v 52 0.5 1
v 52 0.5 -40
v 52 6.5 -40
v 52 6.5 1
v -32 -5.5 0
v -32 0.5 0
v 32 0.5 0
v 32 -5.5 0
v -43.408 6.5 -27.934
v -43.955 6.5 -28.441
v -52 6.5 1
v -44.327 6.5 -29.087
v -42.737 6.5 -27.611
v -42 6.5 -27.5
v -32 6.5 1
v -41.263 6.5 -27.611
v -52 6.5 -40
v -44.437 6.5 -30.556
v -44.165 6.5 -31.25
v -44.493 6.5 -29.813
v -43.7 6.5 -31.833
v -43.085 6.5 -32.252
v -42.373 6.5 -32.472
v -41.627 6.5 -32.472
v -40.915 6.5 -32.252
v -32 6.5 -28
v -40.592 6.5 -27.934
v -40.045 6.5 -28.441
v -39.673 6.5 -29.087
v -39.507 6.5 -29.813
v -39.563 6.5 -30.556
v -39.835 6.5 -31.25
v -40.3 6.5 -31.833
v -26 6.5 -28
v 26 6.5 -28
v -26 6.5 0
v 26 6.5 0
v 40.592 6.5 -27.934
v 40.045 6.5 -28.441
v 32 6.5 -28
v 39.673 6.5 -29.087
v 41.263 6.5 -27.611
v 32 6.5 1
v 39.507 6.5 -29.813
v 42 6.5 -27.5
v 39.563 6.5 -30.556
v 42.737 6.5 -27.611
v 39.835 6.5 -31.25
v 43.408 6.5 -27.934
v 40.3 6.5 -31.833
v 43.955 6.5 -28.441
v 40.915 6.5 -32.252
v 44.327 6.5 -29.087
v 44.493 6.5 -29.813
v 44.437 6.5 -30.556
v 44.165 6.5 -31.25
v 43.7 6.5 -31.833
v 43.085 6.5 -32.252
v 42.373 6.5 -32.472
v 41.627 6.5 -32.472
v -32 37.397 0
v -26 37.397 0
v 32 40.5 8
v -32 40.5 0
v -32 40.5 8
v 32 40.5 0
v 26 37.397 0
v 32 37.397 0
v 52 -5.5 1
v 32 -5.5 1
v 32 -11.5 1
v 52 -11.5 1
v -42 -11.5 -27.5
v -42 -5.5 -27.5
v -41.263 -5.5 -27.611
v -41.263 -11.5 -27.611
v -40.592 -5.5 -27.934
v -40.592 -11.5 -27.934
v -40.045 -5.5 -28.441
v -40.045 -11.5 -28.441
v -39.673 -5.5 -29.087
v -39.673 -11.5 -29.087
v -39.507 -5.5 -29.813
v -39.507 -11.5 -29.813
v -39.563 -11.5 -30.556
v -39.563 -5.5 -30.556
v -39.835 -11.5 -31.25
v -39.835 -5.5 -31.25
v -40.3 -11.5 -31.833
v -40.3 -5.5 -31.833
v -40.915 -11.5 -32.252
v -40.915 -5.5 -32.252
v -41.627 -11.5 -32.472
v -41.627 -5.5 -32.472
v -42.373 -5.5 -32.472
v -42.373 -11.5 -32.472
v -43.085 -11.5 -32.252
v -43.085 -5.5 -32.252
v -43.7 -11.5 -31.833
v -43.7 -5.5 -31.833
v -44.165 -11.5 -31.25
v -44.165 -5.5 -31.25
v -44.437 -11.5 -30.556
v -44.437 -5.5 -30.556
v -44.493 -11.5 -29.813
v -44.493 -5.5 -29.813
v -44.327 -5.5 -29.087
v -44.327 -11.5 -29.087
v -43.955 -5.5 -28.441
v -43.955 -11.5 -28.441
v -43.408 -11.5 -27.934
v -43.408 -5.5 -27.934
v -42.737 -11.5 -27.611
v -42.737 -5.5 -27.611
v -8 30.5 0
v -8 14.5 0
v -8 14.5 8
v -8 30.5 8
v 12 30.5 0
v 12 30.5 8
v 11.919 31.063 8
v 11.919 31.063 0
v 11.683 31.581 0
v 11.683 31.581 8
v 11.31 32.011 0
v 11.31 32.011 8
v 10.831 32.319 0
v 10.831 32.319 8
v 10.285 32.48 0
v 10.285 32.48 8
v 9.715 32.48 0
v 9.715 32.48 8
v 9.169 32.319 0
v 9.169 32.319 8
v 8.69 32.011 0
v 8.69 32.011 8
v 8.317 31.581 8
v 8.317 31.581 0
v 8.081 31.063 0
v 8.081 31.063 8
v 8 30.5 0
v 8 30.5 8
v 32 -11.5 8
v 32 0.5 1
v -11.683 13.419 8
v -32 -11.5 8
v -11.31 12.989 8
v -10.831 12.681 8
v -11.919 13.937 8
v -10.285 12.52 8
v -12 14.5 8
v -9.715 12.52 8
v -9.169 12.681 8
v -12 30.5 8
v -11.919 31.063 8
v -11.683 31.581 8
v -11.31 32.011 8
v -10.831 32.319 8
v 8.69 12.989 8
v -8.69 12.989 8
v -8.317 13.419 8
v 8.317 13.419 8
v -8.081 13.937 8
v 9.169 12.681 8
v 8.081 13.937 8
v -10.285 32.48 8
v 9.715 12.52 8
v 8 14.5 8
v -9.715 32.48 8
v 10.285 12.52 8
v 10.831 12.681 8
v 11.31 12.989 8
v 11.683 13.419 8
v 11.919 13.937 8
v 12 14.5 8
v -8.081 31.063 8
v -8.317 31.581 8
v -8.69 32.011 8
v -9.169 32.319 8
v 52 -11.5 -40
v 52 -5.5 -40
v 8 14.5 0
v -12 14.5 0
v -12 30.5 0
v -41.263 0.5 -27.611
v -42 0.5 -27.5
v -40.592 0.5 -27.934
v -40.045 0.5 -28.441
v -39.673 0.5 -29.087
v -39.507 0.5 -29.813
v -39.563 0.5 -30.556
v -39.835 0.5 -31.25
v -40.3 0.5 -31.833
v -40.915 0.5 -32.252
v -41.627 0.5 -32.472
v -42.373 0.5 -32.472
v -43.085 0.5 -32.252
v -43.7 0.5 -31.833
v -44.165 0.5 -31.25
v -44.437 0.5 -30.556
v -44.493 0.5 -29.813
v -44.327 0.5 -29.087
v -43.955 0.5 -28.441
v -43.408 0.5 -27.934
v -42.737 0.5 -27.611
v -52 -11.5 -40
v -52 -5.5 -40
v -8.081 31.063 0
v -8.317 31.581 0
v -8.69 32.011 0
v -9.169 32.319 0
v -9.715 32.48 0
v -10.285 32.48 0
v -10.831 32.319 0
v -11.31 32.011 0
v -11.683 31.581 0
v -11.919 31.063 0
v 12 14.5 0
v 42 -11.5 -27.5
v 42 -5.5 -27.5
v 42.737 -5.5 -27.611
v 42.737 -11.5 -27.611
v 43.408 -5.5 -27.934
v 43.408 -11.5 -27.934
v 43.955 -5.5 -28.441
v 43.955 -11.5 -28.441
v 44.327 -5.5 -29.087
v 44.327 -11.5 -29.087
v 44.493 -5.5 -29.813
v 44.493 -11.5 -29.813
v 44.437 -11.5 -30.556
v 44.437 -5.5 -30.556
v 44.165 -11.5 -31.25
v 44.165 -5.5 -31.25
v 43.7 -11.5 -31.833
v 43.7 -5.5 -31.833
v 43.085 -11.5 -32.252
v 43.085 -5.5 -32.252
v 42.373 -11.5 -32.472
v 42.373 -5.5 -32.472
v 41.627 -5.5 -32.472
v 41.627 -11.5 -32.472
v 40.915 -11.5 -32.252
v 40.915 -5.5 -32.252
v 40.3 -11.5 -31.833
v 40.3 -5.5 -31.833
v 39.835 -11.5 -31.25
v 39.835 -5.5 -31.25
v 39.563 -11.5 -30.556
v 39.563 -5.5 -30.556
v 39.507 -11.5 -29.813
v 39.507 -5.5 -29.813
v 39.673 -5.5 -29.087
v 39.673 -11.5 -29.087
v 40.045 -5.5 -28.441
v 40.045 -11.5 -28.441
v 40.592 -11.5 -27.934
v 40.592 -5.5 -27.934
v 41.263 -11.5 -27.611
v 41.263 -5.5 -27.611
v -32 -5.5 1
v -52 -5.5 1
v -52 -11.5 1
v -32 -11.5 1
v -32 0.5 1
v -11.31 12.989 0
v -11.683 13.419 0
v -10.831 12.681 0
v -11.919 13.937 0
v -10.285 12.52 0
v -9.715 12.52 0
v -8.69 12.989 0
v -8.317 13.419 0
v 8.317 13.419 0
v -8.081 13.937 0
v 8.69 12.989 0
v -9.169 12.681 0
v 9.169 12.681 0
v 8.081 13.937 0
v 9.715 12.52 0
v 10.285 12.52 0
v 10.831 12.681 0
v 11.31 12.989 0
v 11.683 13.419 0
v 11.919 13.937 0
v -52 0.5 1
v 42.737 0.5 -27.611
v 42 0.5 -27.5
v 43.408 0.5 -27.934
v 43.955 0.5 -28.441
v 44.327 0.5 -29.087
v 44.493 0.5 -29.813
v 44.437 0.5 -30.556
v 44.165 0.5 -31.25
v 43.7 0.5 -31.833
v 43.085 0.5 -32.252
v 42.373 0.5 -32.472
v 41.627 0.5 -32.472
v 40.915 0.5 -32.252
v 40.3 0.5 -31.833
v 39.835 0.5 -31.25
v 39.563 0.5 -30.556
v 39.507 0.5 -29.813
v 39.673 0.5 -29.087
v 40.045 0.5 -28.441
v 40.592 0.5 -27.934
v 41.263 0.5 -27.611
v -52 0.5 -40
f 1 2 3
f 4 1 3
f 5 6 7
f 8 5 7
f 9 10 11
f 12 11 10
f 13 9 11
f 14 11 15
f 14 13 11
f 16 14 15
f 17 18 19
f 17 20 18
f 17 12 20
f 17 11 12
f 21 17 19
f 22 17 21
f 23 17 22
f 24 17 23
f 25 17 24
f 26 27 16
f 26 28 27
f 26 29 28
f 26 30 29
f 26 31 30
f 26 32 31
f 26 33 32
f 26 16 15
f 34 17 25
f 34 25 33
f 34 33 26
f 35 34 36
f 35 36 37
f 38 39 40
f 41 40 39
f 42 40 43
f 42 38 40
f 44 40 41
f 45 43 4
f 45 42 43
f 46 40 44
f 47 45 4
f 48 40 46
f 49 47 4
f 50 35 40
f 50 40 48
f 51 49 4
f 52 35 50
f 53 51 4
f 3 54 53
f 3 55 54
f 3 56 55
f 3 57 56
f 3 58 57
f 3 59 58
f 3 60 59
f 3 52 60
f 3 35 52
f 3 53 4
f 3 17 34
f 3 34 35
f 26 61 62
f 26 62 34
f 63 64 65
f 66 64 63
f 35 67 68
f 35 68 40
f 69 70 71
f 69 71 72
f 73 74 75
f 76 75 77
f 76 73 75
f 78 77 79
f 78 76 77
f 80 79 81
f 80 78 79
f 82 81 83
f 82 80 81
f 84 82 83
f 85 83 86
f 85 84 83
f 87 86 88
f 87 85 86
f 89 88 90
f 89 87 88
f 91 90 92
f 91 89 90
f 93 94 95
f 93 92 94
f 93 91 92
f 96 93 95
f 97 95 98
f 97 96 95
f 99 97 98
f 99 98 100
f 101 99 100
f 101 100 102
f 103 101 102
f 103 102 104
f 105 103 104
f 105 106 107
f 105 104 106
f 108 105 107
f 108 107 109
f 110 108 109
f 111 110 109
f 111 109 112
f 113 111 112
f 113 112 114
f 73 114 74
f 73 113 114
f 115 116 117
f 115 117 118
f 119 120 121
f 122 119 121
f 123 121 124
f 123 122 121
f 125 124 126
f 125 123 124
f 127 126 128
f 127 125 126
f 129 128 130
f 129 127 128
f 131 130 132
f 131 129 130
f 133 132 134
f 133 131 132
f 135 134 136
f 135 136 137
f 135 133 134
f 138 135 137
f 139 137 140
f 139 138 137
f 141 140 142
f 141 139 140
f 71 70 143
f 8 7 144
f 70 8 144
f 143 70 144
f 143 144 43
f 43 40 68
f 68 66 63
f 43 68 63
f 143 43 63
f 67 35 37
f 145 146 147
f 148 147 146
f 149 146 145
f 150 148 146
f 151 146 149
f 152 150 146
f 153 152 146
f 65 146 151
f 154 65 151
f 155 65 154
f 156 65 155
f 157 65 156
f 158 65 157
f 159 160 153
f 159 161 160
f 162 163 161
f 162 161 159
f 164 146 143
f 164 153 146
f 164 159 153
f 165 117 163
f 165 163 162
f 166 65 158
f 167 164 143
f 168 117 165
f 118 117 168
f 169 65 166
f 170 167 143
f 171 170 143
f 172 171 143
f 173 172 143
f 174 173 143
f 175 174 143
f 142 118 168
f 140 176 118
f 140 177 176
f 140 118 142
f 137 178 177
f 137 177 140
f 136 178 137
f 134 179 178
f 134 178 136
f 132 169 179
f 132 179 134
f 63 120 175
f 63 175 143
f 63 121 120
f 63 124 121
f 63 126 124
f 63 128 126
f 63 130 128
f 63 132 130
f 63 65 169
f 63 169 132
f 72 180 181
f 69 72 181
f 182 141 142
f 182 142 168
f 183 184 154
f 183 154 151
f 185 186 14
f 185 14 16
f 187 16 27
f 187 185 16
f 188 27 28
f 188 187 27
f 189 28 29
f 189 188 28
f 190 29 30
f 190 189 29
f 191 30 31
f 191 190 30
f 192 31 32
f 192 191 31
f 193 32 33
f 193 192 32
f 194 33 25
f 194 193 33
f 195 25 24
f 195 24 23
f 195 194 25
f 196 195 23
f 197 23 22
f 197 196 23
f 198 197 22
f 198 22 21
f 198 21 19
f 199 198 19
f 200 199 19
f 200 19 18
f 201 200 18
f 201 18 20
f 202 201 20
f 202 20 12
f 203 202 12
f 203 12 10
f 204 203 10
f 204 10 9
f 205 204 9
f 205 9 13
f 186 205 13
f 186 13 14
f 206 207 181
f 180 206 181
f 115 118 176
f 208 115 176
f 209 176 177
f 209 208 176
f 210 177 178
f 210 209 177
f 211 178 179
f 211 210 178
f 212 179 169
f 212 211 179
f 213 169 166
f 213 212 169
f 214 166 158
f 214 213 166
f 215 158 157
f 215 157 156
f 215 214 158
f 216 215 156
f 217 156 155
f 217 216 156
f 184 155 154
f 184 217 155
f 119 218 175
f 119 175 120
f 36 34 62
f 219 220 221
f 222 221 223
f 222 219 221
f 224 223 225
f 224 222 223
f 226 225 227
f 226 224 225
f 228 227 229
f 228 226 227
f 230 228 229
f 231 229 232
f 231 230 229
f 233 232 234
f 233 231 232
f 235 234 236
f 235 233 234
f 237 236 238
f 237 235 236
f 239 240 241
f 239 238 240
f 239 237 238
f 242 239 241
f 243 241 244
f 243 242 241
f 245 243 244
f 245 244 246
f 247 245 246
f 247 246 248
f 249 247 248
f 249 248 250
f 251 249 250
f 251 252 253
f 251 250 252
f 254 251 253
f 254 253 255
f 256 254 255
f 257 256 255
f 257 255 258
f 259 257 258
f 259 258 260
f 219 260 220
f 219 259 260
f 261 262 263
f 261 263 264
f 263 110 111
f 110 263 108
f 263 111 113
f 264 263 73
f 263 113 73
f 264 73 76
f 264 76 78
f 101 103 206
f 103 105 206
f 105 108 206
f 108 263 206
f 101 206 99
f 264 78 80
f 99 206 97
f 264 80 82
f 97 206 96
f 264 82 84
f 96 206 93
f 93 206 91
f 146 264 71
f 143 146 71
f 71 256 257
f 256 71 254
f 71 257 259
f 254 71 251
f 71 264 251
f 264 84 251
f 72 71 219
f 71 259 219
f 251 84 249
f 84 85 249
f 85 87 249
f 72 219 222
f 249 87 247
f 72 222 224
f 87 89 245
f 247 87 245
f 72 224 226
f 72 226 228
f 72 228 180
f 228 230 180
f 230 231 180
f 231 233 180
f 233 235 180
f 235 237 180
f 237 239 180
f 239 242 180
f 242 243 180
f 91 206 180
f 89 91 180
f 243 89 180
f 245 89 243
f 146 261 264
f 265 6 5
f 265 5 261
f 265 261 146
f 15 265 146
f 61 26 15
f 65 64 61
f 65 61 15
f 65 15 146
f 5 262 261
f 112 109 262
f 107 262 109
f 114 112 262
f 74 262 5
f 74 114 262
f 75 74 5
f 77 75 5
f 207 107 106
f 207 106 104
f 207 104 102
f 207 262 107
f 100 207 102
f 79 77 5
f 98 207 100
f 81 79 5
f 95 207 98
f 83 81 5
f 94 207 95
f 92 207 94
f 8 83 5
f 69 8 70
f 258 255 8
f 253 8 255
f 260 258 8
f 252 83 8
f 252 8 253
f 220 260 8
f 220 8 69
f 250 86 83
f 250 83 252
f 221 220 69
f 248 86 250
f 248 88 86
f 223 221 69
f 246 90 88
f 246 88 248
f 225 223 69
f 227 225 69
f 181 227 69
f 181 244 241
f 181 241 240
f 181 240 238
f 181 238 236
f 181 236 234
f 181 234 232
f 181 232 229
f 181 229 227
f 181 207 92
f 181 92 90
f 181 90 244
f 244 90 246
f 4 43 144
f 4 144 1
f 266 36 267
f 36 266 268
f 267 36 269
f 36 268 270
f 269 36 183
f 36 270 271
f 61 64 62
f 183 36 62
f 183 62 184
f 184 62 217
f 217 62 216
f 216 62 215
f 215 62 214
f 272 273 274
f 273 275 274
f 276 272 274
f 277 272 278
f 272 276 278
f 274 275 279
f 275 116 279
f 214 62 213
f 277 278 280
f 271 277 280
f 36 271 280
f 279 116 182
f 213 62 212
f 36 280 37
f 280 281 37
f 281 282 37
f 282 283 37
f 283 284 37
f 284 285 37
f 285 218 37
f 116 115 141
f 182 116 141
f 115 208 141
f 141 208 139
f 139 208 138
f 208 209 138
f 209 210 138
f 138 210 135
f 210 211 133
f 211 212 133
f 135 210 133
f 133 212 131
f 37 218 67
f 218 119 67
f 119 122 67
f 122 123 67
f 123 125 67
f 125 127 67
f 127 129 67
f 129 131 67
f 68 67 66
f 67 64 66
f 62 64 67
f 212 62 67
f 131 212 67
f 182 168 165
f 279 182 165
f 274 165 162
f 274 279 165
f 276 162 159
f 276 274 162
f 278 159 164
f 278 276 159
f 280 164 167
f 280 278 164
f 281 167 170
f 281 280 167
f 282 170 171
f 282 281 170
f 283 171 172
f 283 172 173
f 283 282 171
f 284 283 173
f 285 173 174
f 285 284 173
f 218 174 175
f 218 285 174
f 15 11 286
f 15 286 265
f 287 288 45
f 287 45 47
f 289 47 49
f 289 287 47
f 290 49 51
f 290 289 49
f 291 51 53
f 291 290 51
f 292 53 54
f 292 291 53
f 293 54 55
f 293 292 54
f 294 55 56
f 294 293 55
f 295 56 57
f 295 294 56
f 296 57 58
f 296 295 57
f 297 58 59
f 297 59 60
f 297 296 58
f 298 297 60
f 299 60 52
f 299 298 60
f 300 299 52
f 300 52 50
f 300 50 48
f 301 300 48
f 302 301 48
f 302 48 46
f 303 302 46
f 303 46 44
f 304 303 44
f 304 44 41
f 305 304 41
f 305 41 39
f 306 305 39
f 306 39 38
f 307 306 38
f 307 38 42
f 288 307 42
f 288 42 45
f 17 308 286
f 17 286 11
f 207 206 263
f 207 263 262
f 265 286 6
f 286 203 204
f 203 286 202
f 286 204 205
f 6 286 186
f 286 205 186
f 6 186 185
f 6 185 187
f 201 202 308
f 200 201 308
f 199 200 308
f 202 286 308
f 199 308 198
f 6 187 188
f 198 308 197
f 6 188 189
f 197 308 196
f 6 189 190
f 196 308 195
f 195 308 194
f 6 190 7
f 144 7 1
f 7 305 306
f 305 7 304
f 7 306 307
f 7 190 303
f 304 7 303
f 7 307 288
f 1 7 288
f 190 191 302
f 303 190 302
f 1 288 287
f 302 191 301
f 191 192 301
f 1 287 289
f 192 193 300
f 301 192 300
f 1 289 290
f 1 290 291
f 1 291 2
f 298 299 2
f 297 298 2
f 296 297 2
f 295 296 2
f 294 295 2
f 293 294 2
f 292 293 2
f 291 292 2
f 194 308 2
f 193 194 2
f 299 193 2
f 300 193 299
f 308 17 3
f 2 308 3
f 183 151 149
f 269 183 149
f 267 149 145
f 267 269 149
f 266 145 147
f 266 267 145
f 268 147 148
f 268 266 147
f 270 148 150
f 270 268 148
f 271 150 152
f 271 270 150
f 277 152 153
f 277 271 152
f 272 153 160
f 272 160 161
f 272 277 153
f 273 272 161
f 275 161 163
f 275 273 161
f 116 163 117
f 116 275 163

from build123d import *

# Parameters (mm, degrees)
SKETCH_1_W             = 64
SKETCH_1_H             = 52
EXTRUDE_348_DEPTH      = 8
EXTRUDE_START          = -40
SKETCH_2_W             = 104
SKETCH_2_H             = 6
EXTRUDE_C_6_DEPTH      = 41
SKETCH_3_W             = 104
SKETCH_3_H             = 6
EXTRUDE_C_6_2_DEPTH    = 41
EXTRUDE_START_2        = -32
EXTRUDE_798_DEPTH      = 6
EXTRUDE_START_3        = 26
EXTRUDE_5_DEPTH        = 6
CUT_EXTRUDE_8_DEPTH    = 8
CUT_EXTRUDE_START      = -11.5
SKETCH_7_R             = 2.5
CUT_EXTRUDE_1237_DEPTH = 18


with BuildPart() as part:
    # 草图1 → Extrude 348 (new body)
    with BuildSketch(Plane.XY):
        with Locations((0, 14.5)):
            Rectangle(SKETCH_1_W, SKETCH_1_H)
    extrude(amount=EXTRUDE_348_DEPTH)

    # 草图2 → Extrude C_6 (add)
    with BuildSketch(Plane.XY.offset(EXTRUDE_START)):
        with Locations((0, -8.5)):
            Rectangle(SKETCH_2_W, SKETCH_2_H)
    extrude(amount=EXTRUDE_C_6_DEPTH)

    # 草图3 → Extrude C_6 2 (add)
    with BuildSketch(Plane.XY.offset(EXTRUDE_START)):
        with Locations((0, 3.5)):
            Rectangle(SKETCH_3_W, SKETCH_3_H)
    extrude(amount=EXTRUDE_C_6_2_DEPTH)

    # 草图4 → Extrude 798 (add)
    with BuildSketch(Plane(origin=(0, 0, 0), x_dir=(0, 0, -1), z_dir=(1, 0, 0)).offset(EXTRUDE_START_2)):
        Polygon((28, 6.5), (-1, 6.5), (-1, 38.5), align=None)
    extrude(amount=EXTRUDE_798_DEPTH)

    # 草图5 → 凸台-拉伸5 (add)
    with BuildSketch(Plane(origin=(0, 0, 0), x_dir=(0, 0, -1), z_dir=(1, 0, 0)).offset(EXTRUDE_START_3)):
        Polygon((28, 6.5), (-1, 6.5), (-1, 38.5), align=None)
    extrude(amount=EXTRUDE_5_DEPTH)

    # 草图6 → 上下可调槽_中心行程正负8 (cut)
    with BuildSketch(Plane.XY):
        with BuildLine():
            Line((-8, 14.5), (-8, 30.5))
            ThreePointArc((-8, 30.5), (-10, 32.5), (-12, 30.5))
            Line((-12, 30.5), (-12, 14.5))
            ThreePointArc((-12, 14.5), (-10, 12.5), (-8, 14.5))
        make_face()
        with BuildLine():
            Line((12, 14.5), (12, 30.5))
            ThreePointArc((12, 30.5), (10, 32.5), (8, 30.5))
            Line((8, 30.5), (8, 14.5))
            ThreePointArc((8, 14.5), (10, 12.5), (12, 14.5))
        make_face()
    extrude(amount=CUT_EXTRUDE_8_DEPTH, mode=Mode.SUBTRACT)

    # 草图7 → Cut-Extrude 1237 (cut)
    with BuildSketch(Plane(origin=(0, 0, 0), x_dir=(1, 0, 0), z_dir=(0, 1, 0)).offset(CUT_EXTRUDE_START)):
        with Locations(Location((-42, 30, 0), (0, 0, 270))):
            Circle(SKETCH_7_R)
        with Locations(Location((42, 30, 0), (0, 0, 270))):
            Circle(SKETCH_7_R)
    extrude(amount=CUT_EXTRUDE_1237_DEPTH, mode=Mode.SUBTRACT)


solid = part.part
